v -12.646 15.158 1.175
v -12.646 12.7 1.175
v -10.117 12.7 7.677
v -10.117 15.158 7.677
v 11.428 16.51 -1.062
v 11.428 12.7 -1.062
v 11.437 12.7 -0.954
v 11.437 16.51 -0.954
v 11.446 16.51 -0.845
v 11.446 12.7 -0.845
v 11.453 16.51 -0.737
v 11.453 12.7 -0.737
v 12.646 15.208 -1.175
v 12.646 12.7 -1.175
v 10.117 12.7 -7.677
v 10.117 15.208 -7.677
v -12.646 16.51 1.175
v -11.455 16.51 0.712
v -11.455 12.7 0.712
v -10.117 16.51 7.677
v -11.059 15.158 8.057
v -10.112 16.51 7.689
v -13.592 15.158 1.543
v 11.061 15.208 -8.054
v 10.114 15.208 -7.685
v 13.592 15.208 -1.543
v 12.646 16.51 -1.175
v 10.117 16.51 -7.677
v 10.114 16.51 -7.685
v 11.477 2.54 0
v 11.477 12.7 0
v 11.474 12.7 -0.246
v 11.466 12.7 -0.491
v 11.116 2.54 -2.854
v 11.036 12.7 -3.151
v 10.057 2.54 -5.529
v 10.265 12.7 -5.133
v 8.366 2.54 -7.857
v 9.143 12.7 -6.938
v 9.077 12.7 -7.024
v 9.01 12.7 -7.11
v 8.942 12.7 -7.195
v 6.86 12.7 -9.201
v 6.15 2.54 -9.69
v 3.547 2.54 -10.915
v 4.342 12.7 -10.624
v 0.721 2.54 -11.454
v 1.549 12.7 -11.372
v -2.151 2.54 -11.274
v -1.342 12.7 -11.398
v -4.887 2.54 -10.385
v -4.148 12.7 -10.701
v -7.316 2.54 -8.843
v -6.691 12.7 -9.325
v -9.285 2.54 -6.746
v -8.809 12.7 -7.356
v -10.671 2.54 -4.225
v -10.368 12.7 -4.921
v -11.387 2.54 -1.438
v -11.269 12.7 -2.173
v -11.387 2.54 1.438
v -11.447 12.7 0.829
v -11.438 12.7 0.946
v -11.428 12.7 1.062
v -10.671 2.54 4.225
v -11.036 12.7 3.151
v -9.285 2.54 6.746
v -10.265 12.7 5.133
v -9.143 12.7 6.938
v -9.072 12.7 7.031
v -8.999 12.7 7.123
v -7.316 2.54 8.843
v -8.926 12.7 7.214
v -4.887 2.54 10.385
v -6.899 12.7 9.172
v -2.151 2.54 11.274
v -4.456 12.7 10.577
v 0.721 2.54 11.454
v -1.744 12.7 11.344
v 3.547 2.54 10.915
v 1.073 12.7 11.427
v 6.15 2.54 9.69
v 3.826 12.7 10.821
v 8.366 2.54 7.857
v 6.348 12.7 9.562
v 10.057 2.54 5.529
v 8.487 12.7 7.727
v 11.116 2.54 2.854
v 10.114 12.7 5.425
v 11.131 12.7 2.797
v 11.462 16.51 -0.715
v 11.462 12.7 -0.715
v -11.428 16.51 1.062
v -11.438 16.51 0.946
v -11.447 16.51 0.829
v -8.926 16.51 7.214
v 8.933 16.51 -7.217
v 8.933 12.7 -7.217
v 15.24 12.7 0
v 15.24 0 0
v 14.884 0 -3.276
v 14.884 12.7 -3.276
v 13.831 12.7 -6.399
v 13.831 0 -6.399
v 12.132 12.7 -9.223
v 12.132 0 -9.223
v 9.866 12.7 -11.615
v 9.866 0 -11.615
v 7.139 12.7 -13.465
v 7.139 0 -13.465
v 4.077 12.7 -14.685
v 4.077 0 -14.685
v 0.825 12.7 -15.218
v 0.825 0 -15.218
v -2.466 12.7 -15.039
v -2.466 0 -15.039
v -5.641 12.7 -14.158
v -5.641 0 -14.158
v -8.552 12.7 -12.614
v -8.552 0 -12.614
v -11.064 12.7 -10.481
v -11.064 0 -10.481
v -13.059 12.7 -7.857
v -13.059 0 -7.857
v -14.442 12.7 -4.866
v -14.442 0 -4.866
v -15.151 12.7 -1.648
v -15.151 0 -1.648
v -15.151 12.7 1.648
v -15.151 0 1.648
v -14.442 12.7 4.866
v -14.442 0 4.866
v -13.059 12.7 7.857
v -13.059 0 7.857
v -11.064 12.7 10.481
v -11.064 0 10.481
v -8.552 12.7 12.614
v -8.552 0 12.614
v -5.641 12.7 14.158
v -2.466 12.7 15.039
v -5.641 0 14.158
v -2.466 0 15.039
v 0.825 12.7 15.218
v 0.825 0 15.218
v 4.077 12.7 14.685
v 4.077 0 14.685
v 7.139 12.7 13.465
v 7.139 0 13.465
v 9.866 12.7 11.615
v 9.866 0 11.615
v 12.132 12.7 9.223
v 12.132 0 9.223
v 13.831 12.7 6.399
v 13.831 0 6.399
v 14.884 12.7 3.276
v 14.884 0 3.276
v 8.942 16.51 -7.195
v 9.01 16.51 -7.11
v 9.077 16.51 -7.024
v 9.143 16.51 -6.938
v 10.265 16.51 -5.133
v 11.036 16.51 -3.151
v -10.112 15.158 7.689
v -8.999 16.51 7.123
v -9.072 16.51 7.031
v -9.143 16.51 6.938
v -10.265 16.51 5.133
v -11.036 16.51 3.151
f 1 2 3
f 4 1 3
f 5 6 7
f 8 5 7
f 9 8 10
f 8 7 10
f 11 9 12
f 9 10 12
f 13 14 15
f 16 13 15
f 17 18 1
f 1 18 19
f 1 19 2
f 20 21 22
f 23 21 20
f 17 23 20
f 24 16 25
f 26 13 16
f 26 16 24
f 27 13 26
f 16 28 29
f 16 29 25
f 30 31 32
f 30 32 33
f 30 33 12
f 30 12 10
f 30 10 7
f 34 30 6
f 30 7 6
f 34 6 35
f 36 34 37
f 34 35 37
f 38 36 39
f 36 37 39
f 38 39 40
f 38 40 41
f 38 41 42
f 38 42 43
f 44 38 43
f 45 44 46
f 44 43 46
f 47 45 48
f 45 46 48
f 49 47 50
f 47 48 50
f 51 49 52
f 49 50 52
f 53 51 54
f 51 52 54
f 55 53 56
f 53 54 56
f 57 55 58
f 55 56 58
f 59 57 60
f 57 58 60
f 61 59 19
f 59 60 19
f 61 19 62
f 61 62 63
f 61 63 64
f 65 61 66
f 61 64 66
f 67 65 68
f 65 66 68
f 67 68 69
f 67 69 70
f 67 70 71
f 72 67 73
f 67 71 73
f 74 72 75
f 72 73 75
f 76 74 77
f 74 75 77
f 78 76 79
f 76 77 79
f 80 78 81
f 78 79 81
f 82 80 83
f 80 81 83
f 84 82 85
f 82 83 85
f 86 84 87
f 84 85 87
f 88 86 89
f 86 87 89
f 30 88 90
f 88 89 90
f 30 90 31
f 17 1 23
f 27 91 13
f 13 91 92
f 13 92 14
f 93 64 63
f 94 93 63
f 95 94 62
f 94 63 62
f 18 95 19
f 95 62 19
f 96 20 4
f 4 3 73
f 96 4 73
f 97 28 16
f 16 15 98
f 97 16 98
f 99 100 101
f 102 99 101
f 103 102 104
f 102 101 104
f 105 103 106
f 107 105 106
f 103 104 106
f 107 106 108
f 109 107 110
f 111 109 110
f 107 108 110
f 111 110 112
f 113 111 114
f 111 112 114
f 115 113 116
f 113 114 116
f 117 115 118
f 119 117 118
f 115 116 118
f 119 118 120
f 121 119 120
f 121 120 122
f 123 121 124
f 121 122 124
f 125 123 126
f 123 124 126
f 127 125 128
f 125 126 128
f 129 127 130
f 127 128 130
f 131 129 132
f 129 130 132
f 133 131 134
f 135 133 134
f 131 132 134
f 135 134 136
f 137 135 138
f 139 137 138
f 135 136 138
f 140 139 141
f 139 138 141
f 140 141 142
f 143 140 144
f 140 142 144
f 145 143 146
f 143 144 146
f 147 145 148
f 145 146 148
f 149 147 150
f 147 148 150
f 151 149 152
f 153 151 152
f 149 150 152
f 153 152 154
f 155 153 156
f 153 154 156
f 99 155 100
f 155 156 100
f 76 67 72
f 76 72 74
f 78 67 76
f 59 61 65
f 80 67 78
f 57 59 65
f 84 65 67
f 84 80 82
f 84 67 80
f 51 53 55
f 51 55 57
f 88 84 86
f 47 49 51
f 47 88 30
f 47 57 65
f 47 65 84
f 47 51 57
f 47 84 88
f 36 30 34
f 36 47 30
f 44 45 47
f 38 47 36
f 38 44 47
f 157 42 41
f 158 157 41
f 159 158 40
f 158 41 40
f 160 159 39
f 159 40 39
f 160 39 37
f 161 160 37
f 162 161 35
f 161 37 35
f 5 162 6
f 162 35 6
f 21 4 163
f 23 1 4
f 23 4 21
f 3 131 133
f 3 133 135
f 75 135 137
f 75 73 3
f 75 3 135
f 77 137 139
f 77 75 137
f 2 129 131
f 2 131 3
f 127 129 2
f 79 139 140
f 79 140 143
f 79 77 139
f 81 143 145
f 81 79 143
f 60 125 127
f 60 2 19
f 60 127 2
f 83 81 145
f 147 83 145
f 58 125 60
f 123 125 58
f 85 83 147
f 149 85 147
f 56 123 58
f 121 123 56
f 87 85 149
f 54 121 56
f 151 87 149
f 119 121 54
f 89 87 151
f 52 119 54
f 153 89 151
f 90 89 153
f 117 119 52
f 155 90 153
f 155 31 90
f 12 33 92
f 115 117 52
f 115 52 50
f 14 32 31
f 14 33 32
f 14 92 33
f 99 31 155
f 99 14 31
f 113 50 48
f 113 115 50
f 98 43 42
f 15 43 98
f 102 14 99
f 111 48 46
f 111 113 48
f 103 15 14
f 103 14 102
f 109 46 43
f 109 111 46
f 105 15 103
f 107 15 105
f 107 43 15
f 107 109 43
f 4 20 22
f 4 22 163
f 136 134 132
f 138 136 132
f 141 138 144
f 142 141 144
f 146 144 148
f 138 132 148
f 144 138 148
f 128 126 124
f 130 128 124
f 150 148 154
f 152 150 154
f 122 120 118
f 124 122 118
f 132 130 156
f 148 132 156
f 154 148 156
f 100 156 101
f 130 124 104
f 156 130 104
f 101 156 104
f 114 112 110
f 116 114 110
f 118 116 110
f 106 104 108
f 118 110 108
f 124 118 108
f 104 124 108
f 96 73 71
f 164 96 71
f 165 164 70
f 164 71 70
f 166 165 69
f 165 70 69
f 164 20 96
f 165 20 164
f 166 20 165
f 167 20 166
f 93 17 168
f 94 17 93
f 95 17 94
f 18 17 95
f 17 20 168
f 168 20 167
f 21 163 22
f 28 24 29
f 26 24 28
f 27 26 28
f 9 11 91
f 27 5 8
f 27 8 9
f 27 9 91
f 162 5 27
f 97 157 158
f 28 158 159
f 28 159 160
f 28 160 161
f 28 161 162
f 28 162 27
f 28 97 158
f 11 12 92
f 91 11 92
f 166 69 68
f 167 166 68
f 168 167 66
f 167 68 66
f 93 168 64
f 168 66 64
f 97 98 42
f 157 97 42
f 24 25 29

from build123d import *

# Parameters (mm, degrees)
SKETCH1_R            = 15.24
BOSS_EXTRUDE1_DEPTH  = 12.7
BOSS_EXTRUDE10_DEPTH = 3.81
BOSS_EXTRUDE11_DEPTH = 6.989290822
BOSS_EXTRUDE12_DEPTH = 6.985
SKETCH9_R            = 11.477020293
CUT_EXTRUDE3_DEPTH   = 10.16


with BuildPart() as part:
    # Sketch1 → Boss-Extrude1 (new body)
    with BuildSketch(Plane(origin=(0, 0, 0), x_dir=(1, 0, 0), z_dir=(0, 1, 0))):
        Circle(SKETCH1_R)
    extrude(amount=BOSS_EXTRUDE1_DEPTH)

    # Sketch3 → Boss-Extrude10 (add)
    with BuildSketch(Plane(origin=(0, 12.7, 0), x_dir=(1, 0, 0), z_dir=(0, 1, 0))):
        with BuildLine():
            Line((11.427775698, 1.062043977), (12.64550795, 1.175214312))
            Line((12.64550795, 1.175214312), (10.116961472, 7.677049601))
            Line((10.116961472, 7.677049601), (9.142722214, 6.937768036))
            ThreePointArc((9.142722214, 6.937768036), (10.696605975, 4.159881659), (11.427775698, 1.062043977))
        make_face()
        with BuildLine():
            Line((9.142722214, 6.937768036), (10.116961472, 7.677049601))
            Line((10.116961472, 7.677049601), (8.93331892, 7.216734155))
            Line((8.93331892, 7.216734155), (8.94183947, 7.194824647))
            ThreePointArc((8.94183947, 7.194824647), (9.043194256, 7.06701015), (9.142722214, 6.937768036))
        make_face()
        with BuildLine():
            Line((11.461865398, 0.714898867), (12.64550795, 1.175214312))
            Line((12.64550795, 1.175214312), (11.427775698, 1.062043977))
            ThreePointArc((11.427775698, 1.062043977), (11.441715952, 0.899517032), (11.453344849, 0.736808375))
            Line((11.453344849, 0.736808375), (11.461865398, 0.714898867))
        make_face()
        with BuildLine():
            Line((-9.142722214, -6.937768036), (-10.116961472, -7.677049601))
            Line((-10.116961472, -7.677049601), (-8.926355488, -7.214026095))
            ThreePointArc((-8.926355488, -7.214026095), (-9.035594717, -7.076724025), (-9.142722214, -6.937768036))
        make_face()
        with BuildLine():
            Line((-11.427775698, -1.062043977), (-12.64550795, -1.175214312))
            Line((-12.64550795, -1.175214312), (-10.116961472, -7.677049601))
            Line((-10.116961472, -7.677049601), (-9.142722214, -6.937768036))
            ThreePointArc((-9.142722214, -6.937768036), (-10.696605975, -4.159881659), (-11.427775698, -1.062043977))
        make_face()
        with BuildLine():
            Line((-11.454901967, -0.712190807), (-12.64550795, -1.175214312))
            Line((-12.64550795, -1.175214312), (-11.427775698, -1.062043977))
            ThreePointArc((-11.427775698, -1.062043977), (-11.44267598, -0.887221069), (-11.454901967, -0.712190807))
        make_face()
    extrude(amount=BOSS_EXTRUDE10_DEPTH)

    # Sketch6 → Boss-Extrude11 (add)
    with BuildSketch(Plane(origin=(-1.264273239, 0, -3.250917644), x_dir=(-0.932002009, 0, 0.362453107), z_dir=(-0.362453107, 0, -0.932002009))):
        Polygon((12.211598898, 16.51), (12.211598898, 15.157865498), (13.227598898, 15.157865498), align=None)
    extrude(amount=-BOSS_EXTRUDE11_DEPTH)

    # Sketch7 → Boss-Extrude12 (add)
    with BuildSketch(Plane(origin=(1.264273239, 0, 3.250917644), x_dir=(0.932002009, 0, -0.362453107), z_dir=(0.362453107, 0, 0.932002009))):
        Polygon((12.211598898, 16.51), (12.211598898, 15.207573147), (13.227598898, 15.207573147), align=None)
    extrude(amount=-BOSS_EXTRUDE12_DEPTH)

    # Sketch9 → Cut-Extrude3 (cut)
    with BuildSketch(Plane(origin=(0, 12.7, 0), x_dir=(1, 0, 0), z_dir=(0, 1, 0))):
        Circle(SKETCH9_R)
    extrude(amount=-CUT_EXTRUDE3_DEPTH, mode=Mode.SUBTRACT)


solid = part.part
